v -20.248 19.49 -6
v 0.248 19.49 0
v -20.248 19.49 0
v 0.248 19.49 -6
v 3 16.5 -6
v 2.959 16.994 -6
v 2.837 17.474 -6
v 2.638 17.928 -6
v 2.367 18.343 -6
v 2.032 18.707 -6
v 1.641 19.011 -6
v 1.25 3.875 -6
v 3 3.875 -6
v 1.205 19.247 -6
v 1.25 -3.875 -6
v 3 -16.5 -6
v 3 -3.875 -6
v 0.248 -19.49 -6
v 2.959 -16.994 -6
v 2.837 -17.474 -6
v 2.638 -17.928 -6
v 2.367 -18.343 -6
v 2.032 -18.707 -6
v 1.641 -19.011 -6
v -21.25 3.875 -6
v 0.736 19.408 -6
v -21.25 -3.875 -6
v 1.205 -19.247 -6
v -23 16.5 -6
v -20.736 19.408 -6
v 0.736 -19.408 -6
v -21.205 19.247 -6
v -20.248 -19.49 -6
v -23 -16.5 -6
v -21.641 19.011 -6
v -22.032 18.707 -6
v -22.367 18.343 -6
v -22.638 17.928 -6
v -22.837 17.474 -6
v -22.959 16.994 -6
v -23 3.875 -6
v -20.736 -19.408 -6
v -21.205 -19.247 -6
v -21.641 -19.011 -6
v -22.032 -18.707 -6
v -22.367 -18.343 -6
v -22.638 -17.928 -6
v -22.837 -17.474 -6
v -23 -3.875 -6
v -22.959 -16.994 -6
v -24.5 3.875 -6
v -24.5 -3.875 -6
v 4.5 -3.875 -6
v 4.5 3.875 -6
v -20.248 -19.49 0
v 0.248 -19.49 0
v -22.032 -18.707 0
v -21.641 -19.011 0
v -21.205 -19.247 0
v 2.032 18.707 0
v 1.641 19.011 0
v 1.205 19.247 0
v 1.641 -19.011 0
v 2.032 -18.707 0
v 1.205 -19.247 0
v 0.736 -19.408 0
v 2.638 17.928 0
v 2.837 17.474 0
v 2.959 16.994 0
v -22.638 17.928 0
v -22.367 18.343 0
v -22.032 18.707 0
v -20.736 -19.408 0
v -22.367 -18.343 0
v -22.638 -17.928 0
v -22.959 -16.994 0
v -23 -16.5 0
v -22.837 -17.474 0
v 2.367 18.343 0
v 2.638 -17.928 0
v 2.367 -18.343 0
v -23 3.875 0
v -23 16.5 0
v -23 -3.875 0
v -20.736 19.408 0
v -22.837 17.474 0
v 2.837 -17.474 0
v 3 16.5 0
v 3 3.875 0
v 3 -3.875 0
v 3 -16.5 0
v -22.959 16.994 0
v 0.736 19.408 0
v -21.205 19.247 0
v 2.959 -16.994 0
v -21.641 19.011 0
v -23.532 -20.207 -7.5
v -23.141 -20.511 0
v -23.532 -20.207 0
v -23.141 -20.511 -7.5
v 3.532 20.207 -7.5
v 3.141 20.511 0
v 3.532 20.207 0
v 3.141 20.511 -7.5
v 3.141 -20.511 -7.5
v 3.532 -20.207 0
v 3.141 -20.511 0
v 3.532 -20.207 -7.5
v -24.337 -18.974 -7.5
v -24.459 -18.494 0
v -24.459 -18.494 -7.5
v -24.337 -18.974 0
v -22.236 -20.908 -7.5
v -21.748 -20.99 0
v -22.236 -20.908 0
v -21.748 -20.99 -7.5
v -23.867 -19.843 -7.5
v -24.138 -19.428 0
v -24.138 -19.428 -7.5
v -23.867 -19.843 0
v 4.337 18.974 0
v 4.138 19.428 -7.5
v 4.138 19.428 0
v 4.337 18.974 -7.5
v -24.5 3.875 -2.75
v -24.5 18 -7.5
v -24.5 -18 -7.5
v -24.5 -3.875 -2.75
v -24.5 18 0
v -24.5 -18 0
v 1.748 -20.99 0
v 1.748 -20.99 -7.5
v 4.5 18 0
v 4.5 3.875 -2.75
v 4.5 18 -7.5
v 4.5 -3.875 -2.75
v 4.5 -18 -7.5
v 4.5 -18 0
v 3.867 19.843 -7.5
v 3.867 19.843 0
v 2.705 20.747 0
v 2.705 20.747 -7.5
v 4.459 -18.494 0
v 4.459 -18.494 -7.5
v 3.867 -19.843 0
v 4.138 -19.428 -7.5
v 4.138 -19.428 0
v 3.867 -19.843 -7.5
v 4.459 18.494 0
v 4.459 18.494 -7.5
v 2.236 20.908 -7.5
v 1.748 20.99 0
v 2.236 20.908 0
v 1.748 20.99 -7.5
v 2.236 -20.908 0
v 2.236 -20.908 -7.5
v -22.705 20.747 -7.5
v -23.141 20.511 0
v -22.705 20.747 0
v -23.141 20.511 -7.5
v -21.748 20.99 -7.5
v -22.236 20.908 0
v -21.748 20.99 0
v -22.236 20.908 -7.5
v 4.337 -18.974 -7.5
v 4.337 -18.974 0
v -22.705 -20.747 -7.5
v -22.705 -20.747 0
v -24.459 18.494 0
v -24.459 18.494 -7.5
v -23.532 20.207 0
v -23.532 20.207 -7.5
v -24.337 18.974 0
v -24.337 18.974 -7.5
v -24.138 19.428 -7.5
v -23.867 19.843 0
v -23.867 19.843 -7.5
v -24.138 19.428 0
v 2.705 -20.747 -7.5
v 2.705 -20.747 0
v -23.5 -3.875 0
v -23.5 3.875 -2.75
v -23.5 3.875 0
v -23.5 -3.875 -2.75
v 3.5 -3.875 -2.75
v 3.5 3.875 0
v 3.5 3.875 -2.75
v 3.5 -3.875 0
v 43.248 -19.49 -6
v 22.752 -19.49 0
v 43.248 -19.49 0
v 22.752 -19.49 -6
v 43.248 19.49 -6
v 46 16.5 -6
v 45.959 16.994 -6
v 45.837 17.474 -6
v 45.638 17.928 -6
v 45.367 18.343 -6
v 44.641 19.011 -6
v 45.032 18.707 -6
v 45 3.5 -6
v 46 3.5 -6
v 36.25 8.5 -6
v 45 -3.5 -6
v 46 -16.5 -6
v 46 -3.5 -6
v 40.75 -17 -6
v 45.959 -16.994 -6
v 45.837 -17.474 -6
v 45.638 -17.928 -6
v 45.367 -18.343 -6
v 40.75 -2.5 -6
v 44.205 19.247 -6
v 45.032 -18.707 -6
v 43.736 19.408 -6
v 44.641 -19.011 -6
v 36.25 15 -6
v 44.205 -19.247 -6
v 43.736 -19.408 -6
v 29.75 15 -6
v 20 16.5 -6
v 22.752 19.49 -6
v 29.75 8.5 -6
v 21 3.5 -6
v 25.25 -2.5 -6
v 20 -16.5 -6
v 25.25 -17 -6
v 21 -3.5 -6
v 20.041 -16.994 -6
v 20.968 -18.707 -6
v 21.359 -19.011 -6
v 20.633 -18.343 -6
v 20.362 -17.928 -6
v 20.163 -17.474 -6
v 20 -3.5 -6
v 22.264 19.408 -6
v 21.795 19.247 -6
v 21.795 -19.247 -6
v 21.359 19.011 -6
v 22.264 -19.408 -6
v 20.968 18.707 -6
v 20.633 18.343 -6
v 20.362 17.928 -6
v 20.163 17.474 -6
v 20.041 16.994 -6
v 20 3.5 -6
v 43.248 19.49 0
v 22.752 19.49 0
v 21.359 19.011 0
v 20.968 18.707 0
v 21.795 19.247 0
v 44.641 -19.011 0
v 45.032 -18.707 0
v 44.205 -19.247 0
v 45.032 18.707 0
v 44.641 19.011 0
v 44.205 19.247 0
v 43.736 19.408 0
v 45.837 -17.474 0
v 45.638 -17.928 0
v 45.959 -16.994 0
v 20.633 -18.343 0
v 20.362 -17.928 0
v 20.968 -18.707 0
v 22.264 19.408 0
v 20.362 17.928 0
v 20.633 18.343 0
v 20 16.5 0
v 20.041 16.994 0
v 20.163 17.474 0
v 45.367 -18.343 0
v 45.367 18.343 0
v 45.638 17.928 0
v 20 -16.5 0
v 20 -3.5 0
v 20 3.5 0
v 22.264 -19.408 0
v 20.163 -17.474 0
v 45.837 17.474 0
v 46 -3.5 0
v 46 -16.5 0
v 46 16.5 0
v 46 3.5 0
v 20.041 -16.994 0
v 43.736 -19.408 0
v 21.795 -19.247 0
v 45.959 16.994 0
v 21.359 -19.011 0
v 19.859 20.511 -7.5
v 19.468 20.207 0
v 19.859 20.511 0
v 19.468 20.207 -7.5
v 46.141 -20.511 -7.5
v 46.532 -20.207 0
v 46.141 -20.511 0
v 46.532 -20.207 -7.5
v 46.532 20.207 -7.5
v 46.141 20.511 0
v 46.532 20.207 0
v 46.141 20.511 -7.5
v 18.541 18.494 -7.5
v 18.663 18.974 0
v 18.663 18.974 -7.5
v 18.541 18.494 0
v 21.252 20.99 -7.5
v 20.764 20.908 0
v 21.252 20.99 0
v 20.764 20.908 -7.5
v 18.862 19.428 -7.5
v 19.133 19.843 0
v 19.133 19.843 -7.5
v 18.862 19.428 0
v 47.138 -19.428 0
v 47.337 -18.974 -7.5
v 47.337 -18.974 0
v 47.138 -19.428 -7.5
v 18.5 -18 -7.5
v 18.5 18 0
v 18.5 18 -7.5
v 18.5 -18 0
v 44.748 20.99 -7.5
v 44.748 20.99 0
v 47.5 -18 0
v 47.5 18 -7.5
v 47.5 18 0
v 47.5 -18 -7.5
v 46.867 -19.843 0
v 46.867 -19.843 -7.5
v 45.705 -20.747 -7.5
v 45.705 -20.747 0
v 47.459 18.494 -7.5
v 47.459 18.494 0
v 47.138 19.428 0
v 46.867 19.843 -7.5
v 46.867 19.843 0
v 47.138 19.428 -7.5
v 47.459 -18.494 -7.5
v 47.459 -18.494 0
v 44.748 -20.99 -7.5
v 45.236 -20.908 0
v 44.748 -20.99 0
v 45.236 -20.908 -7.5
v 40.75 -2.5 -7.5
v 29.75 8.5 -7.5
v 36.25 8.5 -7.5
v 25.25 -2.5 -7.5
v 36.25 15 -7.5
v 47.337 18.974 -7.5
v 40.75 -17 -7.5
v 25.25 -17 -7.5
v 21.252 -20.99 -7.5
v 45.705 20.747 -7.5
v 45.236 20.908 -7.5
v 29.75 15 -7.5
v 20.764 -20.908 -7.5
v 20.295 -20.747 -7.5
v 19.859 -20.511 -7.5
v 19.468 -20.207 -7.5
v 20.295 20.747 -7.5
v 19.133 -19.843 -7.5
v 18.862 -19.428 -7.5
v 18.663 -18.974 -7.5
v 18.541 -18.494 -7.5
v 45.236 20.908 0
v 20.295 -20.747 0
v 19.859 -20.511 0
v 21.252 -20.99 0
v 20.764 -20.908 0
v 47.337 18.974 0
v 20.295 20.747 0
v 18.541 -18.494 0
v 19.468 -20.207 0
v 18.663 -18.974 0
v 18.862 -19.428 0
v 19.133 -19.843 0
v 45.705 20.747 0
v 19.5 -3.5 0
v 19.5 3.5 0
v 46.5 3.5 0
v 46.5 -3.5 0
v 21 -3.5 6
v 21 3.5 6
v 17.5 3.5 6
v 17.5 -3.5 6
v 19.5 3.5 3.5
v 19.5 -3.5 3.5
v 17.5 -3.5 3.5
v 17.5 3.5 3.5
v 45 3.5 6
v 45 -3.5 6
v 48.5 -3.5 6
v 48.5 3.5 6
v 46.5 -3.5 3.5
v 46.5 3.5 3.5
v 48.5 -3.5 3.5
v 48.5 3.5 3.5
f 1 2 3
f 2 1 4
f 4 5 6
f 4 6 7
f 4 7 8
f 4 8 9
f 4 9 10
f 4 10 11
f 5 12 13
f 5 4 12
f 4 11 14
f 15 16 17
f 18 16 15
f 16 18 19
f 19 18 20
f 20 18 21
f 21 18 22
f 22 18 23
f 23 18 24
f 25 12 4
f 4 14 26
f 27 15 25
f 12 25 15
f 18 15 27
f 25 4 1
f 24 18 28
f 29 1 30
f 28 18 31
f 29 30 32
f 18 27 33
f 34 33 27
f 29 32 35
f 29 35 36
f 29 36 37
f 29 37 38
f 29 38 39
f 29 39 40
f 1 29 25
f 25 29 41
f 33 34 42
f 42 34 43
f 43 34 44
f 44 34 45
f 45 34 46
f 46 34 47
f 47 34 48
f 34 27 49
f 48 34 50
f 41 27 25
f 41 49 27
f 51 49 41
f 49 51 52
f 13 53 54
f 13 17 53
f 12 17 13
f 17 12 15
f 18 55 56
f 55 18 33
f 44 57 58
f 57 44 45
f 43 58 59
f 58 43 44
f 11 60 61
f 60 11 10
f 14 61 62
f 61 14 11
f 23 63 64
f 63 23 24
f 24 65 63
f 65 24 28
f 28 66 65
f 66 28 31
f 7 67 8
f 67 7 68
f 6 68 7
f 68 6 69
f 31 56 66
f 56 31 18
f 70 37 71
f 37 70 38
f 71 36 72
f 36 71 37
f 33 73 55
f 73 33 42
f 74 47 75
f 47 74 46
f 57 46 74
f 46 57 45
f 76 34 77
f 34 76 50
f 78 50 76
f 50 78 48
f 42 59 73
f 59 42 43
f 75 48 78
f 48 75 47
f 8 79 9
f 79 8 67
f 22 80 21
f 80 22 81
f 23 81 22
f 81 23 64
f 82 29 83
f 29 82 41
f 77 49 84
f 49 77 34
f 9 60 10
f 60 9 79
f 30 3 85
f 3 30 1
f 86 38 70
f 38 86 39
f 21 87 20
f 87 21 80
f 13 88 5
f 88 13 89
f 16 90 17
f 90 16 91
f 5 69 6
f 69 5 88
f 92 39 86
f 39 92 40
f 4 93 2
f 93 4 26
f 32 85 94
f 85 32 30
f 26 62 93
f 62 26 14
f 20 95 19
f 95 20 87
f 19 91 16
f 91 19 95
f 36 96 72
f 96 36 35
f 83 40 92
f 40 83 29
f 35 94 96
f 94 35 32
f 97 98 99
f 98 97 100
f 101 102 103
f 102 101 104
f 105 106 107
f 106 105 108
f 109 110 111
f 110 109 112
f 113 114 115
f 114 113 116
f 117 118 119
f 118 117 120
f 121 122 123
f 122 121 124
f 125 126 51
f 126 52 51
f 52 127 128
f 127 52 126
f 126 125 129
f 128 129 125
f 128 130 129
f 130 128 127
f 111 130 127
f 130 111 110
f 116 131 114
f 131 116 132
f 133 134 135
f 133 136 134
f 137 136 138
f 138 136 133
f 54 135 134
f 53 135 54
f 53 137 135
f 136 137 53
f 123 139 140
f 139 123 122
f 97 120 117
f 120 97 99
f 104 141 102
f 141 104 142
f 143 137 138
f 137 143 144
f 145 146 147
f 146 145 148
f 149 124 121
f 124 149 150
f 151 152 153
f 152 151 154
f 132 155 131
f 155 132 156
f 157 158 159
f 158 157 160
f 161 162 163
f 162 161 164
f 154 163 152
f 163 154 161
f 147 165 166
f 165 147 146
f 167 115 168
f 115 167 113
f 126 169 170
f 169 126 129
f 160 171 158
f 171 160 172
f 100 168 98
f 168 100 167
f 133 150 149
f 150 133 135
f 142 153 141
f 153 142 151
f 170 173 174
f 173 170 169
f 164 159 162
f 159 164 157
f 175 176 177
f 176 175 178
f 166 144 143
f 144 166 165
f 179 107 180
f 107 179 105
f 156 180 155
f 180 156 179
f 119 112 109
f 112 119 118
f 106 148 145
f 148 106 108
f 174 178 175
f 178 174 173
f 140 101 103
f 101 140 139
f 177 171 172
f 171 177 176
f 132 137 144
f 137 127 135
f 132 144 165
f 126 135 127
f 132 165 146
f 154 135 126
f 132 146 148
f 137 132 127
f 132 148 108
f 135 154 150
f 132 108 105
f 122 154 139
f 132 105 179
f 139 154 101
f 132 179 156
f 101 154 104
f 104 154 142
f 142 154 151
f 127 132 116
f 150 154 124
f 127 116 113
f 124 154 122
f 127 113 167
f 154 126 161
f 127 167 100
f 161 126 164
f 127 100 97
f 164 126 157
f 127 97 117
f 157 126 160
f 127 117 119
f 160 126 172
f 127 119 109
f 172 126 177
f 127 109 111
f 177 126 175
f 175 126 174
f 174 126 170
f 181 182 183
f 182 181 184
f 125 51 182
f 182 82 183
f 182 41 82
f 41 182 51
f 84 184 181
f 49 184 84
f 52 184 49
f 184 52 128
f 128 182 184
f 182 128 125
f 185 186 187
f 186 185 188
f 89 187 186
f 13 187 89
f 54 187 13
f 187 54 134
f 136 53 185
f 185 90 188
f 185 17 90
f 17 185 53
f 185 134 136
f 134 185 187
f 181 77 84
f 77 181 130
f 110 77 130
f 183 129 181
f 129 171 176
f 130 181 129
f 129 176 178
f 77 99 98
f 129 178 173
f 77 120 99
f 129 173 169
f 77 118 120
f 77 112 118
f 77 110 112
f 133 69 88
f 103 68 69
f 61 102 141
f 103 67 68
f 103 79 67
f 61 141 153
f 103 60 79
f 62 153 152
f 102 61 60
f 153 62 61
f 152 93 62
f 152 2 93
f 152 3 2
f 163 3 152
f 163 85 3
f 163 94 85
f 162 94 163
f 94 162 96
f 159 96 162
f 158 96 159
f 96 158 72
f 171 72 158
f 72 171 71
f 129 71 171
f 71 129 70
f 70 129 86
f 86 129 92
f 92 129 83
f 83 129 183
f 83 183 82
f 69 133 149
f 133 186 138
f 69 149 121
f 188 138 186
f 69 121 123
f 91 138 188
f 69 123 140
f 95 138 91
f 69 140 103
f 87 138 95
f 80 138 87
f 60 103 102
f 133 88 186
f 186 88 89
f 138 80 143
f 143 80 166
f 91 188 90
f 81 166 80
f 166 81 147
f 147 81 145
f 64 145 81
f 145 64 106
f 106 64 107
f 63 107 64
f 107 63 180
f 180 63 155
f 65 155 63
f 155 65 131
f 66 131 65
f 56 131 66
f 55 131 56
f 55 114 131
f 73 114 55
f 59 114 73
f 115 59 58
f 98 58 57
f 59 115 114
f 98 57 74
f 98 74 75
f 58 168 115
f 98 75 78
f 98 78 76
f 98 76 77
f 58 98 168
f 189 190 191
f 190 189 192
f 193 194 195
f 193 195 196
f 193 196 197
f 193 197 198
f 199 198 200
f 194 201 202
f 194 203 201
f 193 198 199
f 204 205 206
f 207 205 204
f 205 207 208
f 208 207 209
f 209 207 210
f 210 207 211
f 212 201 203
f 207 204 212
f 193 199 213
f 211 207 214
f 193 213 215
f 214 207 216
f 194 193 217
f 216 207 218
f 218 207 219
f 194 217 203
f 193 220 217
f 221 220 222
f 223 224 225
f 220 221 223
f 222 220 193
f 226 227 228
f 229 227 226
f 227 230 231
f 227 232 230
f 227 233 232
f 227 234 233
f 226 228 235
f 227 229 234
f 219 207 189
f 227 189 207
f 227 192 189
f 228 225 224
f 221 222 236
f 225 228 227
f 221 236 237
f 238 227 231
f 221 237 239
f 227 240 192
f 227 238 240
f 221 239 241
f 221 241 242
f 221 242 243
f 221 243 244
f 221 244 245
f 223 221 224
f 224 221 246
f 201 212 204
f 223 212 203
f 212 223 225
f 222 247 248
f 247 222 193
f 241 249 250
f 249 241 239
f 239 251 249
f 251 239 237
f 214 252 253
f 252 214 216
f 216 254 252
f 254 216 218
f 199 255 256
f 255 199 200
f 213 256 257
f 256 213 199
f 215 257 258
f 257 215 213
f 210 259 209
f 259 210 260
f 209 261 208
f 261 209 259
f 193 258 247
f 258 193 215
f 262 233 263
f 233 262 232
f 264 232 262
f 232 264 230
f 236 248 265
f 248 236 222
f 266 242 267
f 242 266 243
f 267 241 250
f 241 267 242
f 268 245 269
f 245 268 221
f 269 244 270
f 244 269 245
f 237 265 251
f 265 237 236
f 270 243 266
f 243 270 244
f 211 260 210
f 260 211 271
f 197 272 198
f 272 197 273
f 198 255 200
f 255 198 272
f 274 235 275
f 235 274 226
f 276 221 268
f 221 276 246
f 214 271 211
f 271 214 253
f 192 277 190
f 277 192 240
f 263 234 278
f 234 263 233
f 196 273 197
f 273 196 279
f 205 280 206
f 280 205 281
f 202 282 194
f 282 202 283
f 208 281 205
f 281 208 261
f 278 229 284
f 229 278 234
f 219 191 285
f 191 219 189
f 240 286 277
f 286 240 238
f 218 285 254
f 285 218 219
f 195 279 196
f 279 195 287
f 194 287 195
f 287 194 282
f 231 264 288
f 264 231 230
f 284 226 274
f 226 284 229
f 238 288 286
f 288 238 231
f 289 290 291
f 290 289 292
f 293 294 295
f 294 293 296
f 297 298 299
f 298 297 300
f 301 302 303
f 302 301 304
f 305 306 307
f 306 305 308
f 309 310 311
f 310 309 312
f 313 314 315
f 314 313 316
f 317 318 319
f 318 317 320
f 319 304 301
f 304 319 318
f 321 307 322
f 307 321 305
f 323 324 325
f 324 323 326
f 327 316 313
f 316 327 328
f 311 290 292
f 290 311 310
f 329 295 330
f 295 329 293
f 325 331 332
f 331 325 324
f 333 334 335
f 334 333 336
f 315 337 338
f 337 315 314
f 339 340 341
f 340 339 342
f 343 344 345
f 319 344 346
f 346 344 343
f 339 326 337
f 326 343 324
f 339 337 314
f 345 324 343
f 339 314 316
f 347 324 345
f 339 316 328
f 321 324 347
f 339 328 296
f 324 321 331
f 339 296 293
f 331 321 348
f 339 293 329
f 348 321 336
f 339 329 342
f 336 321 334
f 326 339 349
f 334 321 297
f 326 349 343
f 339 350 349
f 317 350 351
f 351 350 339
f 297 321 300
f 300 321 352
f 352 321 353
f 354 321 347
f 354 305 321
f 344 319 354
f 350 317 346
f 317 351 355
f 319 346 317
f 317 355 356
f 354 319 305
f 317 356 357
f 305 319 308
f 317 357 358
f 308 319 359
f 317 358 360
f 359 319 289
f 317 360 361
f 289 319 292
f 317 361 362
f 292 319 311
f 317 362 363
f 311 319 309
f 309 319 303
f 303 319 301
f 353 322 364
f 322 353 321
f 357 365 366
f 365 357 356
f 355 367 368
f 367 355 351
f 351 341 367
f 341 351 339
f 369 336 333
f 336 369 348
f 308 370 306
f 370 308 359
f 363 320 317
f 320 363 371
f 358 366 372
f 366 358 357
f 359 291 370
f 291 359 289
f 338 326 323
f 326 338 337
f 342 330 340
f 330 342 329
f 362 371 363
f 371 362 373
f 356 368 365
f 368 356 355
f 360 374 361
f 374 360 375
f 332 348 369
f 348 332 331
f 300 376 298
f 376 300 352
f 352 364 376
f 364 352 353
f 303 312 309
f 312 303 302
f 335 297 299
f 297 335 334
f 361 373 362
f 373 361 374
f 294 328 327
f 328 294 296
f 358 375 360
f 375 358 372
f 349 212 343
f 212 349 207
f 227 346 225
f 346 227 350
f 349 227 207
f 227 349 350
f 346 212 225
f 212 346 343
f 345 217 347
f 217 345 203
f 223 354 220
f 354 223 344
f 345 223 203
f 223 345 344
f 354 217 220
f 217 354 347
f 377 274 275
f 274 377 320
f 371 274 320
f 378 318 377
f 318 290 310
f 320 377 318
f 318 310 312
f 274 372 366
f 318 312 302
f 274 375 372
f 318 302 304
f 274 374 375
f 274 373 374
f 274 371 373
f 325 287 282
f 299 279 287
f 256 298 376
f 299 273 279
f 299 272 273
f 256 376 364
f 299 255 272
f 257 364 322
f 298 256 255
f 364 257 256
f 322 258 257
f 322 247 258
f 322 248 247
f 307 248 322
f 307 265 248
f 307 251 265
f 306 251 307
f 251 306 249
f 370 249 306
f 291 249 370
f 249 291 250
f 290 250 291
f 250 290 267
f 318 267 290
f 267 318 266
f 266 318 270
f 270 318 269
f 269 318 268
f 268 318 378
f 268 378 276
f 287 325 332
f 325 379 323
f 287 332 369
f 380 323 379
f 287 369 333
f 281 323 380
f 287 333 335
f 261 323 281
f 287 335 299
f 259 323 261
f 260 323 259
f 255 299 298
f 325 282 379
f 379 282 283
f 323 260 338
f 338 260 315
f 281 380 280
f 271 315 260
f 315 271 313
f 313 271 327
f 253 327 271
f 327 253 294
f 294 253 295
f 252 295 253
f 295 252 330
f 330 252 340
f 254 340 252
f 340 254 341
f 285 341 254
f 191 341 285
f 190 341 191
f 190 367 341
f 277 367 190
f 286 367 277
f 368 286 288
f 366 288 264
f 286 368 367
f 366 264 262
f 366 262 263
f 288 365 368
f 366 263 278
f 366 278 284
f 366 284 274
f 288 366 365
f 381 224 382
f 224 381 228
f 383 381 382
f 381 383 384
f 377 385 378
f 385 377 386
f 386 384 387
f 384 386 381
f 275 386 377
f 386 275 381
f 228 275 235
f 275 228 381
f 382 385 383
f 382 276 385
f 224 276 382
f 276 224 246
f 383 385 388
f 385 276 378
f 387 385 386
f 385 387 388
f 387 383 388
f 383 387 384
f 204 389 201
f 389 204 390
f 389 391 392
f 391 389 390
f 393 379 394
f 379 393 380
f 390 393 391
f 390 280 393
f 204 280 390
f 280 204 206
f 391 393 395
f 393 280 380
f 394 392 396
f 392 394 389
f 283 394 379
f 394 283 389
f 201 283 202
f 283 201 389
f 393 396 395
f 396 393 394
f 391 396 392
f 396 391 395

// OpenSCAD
$fa = 1;
$fs = 0.5;
$fn = 0;

wall = 1.5;
dims = [23, 36, 15];
cutout = [15.5, 14.5, 2*wall];
corner_r = 3;
offset = 1;
lip = 1;
dist = 10;

latch = [wall, 7, dims[2]-wall];

button = [6.5,6.5,2*wall];
offset_button = 3;

module skin(debug=false, thickness=5, box=400) {
    if (!debug) intersection() { 
        children(); 
        minkowski() {
            cube(2*thickness,center=true);
            difference() { 
                cube(box,center=true); 
                children(); 
            } 
        } 
    }
    
    if (debug) children();
}

module enclosure(thickness=10) {
    difference() {
        skin(thickness=thickness) {
            hull() {
                translate([0,0,0]) cylinder(h=dims[2], r=corner_r, center=true);
                translate([dims[0],0,0]) cylinder(h=dims[2], r=corner_r, center=true);
                translate([0,dims[1],0]) cylinder(h=dims[2], r=corner_r, center=true);
                translate([dims[0],dims[1],0]) cylinder(h=dims[2], r=corner_r, center=true);
            }
        }
        translate([dims[0]/2-cutout[0]/2, dims[1]-cutout[1]-offset, dims[2]/2-cutout[2]/2]) 
            cube(cutout);
        translate([dims[0]/2-button[0]/2, offset_button, dims[2]/2-button[2]/2])
            cube(button);
    }
}

module latch__(addition=0) {
    latch_(addition);
    translate([dims[0],0,0]) mirror([1,0,0]) latch_(addition);
}

module latch_(addition=0) {
    translate([-corner_r+1, dims[1]/2-latch[1]/2-addition/2, -dims[2]/2+wall]) 
        cube([latch[0],latch[1]+addition,latch[2]]);
    translate([-corner_r-1, dims[1]/2-latch[1]/2-addition/2, -dims[2]/2+wall]) 
        cube([latch[0]+2+addition, latch[1]+addition, wall+1+addition]);
}

module bottom() {
    difference() {
        enclosure(thickness=wall);
        translate([-dims[0], -dims[1], 0]) cube([4*dims[0], 4*dims[1], dims[2]]);
        latch__(0.75);
    }
}

module top() {
    difference() {
        enclosure(thickness=wall);
        translate([-dims[0], -dims[1], -dims[2]]) cube([4*dims[0], 4*dims[1], dims[2]]);
    }
    latch__();
}

translate([-dims[0]/2-dist, -dims[1]/2, 0]) bottom();
translate([dims[0]/2+dist, dims[1]/2, 0]) rotate([180,0,0]) top();
